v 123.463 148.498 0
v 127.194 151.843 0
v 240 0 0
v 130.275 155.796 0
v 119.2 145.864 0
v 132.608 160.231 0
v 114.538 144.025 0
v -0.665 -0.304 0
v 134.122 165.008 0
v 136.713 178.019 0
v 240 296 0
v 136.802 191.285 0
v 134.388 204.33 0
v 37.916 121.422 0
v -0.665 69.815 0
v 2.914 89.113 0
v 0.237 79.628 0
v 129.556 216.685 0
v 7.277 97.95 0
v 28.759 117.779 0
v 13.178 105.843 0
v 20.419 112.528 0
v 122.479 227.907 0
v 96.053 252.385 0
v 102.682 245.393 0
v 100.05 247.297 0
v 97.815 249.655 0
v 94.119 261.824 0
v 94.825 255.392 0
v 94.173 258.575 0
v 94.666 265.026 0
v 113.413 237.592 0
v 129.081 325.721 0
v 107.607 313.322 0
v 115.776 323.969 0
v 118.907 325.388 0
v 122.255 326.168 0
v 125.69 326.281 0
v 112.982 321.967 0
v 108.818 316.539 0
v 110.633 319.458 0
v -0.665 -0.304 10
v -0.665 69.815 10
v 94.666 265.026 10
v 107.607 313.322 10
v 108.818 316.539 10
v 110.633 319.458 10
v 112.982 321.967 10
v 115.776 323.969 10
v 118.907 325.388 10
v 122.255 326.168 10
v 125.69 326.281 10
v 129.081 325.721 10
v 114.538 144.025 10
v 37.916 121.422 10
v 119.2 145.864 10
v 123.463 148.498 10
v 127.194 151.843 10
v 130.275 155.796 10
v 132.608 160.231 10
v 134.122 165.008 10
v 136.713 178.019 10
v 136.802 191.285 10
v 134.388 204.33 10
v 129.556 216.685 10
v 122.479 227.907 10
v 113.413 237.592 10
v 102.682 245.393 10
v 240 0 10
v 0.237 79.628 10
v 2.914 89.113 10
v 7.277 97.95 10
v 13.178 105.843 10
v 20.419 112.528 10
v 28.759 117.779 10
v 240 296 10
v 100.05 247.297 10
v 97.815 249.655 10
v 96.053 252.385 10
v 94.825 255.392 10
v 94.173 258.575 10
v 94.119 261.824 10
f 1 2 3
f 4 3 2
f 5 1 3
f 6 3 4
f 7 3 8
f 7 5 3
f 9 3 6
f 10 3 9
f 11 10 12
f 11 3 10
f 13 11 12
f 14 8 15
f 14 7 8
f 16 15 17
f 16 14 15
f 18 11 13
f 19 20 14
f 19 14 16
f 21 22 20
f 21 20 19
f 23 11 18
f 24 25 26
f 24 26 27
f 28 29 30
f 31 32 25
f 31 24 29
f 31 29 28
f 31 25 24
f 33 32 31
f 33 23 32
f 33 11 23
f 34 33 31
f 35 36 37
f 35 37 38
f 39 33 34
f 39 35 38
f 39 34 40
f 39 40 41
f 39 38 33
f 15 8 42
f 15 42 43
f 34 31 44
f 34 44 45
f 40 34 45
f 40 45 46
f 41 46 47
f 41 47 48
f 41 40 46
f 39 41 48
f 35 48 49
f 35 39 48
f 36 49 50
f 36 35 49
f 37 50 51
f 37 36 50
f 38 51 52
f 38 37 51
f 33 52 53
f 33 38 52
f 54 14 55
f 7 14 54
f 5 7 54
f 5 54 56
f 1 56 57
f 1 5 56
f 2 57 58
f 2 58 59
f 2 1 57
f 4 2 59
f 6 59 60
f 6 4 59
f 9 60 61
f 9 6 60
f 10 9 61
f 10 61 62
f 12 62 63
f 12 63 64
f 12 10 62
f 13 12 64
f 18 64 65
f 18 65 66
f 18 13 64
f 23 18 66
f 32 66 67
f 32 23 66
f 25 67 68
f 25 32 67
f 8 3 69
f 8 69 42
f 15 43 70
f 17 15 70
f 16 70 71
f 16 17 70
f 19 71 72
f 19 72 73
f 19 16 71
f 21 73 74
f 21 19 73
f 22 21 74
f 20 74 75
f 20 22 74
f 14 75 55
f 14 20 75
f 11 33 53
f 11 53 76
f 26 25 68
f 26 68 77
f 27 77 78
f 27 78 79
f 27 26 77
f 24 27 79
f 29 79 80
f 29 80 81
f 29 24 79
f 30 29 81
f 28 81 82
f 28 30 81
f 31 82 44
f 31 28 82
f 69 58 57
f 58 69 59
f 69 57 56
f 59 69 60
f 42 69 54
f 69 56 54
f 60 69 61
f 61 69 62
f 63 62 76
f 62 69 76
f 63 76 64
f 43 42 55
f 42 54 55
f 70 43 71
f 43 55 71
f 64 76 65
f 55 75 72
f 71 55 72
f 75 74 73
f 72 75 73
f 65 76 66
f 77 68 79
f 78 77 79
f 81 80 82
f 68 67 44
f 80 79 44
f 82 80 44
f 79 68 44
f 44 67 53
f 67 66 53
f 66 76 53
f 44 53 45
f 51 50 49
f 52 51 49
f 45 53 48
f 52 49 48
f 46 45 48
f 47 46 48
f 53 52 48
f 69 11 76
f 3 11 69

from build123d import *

# Parameters (mm, degrees)
SALIENTE_EXTRUIR1_DEPTH = 10


with BuildPart() as part:
    # Croquis1 → Saliente-Extruir1 (new body)
    with BuildSketch(Plane.XY):
        with BuildLine():
            Line((37.91601702, 121.421613069), (114.537816123, 144.025264418))
            ThreePointArc((114.537816123, 144.025264418), (127.193827362, 151.843476845), (134.121677329, 165.007973069))
            ThreePointArc((134.121677329, 165.007973069), (132.264993157, 210.622251423), (102.682371845, 245.392614983))
            ThreePointArc((102.682371845, 245.392614983), (95.369412387, 253.859995337), (94.665863515, 265.026056643))
            Line((94.665863515, 265.026056643), (107.60681577, 313.322347957))
            ThreePointArc((107.60681577, 313.322347957), (115.776254029, 323.968967178), (129.081215867, 325.720598634))
            Line((129.081215867, 325.720598634), (240, 296))
            Line((240, 296), (240, 0))
            Line((240, 0), (-0.665441115, -0.303814753))
            Line((-0.665441115, -0.303814753), (-0.665441115, 69.814722685))
            ThreePointArc((-0.665441115, 69.814722685), (10.046152069, 102.031954282), (37.91601702, 121.421613069))
        make_face()
    extrude(amount=SALIENTE_EXTRUIR1_DEPTH)


solid = part.part
